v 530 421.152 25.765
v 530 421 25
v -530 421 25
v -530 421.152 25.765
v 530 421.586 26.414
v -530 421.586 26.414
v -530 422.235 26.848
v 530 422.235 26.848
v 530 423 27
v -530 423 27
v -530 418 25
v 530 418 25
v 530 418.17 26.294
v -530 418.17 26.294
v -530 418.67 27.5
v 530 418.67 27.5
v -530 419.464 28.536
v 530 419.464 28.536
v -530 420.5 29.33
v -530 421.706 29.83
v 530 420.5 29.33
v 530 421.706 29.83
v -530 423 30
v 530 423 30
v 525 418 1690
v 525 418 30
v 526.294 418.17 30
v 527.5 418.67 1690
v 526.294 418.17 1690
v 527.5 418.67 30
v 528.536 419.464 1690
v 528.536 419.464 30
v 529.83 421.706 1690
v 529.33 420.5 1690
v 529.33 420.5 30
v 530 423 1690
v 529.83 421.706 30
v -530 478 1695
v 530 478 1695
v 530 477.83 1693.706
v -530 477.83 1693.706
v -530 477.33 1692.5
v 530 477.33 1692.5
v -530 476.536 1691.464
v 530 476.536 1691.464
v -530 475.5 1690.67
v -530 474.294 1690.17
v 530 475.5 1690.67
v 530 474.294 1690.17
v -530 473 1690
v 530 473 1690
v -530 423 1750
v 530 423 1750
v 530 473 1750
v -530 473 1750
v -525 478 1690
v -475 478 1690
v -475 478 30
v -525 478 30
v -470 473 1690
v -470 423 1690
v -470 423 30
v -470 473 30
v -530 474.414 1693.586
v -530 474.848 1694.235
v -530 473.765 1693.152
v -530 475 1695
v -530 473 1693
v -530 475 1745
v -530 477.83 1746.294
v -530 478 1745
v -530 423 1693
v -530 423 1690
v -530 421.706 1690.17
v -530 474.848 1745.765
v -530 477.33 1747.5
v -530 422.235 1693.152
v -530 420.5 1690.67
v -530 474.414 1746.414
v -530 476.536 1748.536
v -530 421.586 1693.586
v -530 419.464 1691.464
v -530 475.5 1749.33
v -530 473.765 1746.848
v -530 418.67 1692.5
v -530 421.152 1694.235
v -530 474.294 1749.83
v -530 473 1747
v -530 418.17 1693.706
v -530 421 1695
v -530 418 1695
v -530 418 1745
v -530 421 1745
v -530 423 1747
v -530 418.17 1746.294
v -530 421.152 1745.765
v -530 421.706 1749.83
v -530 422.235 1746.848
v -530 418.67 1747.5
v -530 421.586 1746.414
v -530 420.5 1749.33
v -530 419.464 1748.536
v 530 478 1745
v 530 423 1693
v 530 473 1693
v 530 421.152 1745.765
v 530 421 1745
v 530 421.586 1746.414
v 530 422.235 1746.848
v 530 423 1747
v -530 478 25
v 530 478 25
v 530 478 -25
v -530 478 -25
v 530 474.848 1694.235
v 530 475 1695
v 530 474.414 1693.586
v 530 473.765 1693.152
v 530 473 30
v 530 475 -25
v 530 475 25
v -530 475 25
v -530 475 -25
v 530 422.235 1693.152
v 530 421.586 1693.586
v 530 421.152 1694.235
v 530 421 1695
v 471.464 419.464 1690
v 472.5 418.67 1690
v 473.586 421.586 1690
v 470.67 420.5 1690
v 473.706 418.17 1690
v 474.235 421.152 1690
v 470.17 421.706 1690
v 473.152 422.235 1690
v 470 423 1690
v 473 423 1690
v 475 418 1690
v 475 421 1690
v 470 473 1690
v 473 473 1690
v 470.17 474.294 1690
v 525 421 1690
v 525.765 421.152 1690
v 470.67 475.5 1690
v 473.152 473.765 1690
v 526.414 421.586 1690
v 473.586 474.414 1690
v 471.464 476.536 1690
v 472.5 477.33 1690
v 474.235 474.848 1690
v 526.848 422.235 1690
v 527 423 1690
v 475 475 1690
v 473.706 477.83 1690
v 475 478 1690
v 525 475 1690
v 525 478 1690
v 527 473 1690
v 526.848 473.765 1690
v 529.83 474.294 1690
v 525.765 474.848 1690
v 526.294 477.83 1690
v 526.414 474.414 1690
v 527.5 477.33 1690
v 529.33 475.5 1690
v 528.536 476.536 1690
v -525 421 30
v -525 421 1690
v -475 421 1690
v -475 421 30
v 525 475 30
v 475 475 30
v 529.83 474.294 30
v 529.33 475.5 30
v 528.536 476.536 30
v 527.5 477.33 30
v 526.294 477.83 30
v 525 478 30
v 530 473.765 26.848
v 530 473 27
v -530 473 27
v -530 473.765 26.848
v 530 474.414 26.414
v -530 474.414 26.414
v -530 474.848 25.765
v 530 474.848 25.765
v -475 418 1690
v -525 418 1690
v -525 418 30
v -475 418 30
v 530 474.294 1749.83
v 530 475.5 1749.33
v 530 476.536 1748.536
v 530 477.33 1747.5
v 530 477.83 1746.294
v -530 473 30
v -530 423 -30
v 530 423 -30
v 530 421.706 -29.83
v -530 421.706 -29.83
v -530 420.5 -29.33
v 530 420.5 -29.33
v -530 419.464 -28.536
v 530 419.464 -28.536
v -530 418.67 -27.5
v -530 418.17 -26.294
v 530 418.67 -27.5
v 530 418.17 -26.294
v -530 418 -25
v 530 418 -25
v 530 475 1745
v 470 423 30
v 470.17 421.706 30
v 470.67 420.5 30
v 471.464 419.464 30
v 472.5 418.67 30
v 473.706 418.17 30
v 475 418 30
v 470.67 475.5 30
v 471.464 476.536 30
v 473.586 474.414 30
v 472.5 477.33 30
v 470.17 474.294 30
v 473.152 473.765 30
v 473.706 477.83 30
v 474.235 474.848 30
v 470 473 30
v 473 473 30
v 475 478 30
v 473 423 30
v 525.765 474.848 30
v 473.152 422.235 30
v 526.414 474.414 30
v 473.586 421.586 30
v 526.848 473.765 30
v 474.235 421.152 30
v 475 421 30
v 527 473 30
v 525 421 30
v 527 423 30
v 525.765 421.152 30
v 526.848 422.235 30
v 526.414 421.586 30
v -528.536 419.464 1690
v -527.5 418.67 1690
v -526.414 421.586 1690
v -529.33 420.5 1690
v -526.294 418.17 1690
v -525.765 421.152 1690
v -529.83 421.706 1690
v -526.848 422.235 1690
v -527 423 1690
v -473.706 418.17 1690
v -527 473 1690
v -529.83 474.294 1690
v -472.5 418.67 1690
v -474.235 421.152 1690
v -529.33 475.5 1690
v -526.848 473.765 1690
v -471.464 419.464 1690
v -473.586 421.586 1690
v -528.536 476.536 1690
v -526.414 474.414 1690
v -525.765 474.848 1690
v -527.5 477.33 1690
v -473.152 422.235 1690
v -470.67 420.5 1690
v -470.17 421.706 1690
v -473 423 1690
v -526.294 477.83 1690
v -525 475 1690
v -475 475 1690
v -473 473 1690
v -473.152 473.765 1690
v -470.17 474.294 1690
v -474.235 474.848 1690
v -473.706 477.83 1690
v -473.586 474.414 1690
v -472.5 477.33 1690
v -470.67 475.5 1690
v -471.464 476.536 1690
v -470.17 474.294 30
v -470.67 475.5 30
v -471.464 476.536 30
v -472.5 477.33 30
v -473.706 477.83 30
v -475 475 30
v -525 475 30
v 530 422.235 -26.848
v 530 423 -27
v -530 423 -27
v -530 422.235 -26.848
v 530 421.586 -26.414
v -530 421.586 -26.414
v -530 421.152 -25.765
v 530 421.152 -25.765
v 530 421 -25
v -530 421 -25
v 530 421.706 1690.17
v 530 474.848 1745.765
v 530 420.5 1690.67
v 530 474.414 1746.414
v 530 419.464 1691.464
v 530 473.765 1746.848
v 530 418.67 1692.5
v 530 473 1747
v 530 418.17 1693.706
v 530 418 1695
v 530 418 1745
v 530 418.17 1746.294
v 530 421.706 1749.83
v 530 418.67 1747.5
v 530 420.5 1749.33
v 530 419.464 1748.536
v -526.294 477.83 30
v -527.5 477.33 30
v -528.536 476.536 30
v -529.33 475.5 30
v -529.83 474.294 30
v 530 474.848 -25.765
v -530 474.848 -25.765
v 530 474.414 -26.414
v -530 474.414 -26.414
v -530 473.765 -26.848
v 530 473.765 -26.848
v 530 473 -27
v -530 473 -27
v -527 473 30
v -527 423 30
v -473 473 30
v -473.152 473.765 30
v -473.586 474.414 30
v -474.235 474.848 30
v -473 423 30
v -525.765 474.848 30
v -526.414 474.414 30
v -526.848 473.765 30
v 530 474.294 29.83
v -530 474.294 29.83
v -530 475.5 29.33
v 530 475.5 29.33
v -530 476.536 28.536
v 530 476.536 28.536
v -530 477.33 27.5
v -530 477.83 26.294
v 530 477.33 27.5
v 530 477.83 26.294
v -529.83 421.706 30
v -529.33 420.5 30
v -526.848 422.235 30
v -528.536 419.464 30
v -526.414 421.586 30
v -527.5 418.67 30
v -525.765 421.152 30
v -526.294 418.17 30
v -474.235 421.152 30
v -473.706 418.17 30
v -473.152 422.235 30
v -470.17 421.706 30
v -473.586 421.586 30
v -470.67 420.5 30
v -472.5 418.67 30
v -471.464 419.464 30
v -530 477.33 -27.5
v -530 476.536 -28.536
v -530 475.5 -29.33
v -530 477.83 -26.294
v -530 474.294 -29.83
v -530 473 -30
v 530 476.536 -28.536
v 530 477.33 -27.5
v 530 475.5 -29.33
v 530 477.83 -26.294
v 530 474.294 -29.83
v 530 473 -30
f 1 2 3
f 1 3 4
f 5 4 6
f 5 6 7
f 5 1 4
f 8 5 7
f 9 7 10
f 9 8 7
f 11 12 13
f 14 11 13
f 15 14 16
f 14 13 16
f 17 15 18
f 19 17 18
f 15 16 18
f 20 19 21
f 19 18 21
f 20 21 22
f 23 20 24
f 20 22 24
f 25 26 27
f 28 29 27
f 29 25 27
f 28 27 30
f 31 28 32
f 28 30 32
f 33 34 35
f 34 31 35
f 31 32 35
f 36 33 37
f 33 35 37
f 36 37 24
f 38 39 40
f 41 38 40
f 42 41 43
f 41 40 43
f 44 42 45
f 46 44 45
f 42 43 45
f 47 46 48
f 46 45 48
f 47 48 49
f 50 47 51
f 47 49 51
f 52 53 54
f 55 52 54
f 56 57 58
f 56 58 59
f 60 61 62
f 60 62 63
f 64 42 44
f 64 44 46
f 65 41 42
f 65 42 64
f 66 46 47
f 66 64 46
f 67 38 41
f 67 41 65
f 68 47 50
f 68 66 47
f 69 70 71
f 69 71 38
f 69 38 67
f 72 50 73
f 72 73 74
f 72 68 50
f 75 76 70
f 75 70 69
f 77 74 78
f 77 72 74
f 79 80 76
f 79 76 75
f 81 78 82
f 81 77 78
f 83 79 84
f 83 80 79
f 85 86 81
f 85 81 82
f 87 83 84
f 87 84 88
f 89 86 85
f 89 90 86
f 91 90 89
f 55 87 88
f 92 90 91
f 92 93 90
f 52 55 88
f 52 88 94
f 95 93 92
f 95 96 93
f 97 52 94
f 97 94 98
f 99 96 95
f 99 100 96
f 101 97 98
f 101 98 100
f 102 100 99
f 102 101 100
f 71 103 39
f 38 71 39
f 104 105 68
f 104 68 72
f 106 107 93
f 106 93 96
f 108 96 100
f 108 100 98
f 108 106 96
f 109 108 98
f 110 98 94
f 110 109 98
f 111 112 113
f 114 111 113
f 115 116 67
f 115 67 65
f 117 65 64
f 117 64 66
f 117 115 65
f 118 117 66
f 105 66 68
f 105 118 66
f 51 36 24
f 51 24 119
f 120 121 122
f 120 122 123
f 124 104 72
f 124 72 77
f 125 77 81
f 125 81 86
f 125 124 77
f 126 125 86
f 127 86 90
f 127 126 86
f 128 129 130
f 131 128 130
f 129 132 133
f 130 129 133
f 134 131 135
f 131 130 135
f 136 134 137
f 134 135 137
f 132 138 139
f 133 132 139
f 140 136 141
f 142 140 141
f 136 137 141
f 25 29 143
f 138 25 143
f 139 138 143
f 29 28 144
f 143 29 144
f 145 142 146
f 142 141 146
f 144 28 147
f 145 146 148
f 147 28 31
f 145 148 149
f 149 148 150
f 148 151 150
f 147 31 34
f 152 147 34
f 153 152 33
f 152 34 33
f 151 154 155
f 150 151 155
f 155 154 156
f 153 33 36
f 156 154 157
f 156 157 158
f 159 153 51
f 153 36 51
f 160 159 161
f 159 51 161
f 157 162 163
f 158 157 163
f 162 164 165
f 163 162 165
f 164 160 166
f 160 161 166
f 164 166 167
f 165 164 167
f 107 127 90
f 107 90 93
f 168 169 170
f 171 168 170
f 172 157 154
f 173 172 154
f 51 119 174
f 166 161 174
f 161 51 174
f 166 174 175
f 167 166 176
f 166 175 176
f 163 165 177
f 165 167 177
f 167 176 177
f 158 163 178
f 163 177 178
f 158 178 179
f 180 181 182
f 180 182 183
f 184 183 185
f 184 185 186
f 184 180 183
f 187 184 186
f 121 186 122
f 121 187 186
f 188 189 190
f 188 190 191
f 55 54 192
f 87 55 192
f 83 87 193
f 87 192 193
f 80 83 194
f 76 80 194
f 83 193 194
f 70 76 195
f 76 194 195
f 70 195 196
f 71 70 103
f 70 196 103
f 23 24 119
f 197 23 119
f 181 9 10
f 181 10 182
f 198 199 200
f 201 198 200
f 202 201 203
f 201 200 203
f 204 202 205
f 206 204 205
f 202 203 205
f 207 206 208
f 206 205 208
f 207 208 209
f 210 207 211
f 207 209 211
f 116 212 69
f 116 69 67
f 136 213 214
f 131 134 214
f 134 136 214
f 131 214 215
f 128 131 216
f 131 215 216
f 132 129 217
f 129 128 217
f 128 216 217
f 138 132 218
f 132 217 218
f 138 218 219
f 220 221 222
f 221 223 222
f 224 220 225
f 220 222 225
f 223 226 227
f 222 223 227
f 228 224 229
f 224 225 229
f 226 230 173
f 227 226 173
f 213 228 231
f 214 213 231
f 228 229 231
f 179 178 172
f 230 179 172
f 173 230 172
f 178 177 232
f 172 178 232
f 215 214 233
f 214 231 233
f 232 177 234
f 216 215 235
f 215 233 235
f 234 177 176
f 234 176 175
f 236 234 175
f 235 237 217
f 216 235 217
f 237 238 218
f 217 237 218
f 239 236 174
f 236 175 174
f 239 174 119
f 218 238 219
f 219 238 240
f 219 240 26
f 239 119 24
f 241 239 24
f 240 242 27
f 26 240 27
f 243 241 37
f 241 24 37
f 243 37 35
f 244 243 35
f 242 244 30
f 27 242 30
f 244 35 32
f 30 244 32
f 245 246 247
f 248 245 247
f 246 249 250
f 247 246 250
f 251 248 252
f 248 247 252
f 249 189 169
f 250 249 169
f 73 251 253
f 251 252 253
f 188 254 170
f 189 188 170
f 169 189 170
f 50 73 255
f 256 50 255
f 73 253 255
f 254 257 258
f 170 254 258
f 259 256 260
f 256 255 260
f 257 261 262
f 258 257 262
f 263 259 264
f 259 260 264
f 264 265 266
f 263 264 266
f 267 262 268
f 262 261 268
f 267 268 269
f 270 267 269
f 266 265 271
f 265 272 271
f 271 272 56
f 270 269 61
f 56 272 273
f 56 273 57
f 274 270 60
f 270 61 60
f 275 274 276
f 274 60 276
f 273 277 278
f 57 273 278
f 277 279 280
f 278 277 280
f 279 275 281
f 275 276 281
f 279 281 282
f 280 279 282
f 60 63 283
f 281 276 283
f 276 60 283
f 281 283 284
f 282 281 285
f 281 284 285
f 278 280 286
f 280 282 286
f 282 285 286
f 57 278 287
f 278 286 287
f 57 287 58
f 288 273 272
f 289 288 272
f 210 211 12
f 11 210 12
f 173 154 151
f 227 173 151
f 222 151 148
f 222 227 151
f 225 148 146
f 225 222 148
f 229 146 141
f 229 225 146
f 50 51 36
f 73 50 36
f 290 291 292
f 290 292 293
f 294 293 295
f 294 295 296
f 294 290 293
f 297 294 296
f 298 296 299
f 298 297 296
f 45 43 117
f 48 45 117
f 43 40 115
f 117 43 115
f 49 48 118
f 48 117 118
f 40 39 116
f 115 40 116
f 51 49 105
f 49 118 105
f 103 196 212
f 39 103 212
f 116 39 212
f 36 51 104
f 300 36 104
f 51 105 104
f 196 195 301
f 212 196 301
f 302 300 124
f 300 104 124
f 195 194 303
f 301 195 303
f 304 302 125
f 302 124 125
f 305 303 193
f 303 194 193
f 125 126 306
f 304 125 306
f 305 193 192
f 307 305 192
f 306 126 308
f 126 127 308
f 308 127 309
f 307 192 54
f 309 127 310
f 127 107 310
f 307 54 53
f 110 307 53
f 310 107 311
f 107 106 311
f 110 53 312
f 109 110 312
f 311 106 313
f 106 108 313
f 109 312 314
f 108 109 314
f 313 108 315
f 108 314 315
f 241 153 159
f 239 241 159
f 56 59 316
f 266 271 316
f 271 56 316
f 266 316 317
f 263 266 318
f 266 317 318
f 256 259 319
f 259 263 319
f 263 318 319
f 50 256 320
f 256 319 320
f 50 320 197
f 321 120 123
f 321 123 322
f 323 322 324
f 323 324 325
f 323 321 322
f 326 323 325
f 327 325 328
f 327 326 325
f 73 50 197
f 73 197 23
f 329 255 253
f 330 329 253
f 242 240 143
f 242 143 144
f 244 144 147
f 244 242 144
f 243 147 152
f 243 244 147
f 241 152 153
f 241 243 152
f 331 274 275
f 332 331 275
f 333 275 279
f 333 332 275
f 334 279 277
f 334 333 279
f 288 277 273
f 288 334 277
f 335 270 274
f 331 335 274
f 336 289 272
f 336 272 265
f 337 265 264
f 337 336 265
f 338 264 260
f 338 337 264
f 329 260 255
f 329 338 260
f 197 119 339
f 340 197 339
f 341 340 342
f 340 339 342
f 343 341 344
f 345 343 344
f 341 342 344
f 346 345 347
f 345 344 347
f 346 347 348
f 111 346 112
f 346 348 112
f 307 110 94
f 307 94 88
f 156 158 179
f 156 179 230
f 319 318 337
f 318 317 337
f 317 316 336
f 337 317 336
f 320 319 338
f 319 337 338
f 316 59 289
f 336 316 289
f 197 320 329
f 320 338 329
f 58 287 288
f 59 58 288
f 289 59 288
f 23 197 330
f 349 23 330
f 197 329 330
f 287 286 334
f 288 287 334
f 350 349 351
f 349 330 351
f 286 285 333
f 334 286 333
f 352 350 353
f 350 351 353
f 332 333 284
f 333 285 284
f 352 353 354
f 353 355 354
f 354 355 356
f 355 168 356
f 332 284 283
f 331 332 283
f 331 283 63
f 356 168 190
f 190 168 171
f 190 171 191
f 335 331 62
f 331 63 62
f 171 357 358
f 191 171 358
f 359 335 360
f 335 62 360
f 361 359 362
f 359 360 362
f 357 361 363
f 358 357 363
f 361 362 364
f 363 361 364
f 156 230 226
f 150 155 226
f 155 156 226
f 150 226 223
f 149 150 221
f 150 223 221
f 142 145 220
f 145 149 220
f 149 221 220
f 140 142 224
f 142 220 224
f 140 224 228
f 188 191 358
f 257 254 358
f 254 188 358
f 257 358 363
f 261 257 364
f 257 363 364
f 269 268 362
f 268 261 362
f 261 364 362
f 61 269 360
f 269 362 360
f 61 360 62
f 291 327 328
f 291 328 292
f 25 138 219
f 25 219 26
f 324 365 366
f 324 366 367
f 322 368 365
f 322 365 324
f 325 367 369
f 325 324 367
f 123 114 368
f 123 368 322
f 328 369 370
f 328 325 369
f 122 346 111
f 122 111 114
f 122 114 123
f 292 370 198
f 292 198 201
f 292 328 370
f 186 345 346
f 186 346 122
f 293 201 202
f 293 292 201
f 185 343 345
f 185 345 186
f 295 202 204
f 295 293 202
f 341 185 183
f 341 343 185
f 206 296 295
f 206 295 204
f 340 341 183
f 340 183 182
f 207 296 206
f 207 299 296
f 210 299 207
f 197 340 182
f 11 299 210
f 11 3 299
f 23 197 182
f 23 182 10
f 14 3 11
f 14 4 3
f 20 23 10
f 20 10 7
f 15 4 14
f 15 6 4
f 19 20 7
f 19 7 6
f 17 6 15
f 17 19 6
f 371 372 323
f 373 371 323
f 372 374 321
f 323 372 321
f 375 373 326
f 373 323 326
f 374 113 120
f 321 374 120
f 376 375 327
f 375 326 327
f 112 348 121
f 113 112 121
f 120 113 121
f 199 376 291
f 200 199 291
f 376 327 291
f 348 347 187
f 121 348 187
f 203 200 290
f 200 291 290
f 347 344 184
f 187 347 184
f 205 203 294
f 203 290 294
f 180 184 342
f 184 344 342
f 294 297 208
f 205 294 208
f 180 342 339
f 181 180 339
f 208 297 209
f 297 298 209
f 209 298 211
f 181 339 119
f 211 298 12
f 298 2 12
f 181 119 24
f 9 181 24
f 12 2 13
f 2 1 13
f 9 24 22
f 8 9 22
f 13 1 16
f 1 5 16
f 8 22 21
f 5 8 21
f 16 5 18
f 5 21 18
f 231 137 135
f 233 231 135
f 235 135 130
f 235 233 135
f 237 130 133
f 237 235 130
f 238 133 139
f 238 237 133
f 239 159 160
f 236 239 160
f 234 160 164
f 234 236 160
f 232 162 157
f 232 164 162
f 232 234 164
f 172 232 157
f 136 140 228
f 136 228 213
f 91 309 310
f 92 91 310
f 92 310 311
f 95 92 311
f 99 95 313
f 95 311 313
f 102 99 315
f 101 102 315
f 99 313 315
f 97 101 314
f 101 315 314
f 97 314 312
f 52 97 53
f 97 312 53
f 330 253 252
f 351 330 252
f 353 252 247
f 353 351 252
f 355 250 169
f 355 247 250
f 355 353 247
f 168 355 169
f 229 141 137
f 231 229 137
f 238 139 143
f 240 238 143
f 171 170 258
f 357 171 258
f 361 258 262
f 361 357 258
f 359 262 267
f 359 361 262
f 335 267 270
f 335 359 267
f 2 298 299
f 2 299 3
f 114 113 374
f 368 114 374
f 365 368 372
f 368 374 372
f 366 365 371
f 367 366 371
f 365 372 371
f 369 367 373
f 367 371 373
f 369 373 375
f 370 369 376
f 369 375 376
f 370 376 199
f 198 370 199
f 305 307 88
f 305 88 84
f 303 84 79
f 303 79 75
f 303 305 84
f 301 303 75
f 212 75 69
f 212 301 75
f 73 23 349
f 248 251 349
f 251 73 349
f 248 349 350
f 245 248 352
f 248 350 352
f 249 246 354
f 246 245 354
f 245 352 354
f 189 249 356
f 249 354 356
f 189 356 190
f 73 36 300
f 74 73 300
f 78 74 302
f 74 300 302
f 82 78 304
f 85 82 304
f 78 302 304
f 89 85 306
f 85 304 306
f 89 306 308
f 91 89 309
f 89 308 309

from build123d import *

# Parameters (mm, degrees)
F_120_X_80_X_8_1_DEPTH      = 1030
F_120_X_80_X_8_1_DEPTH_BACK = 30
F_120_X_80_X_8_1_2_DEPTH    = 1060
F_120_X_80_X_8_1_3_DEPTH    = 1722
F_120_X_80_X_8_1_4_DEPTH    = 1722


with BuildPart() as part:
    # Sketch1 → Прямоугольная труба 120 X 80 X 8(1) (new, two sides: drawn at the far end of the back side and taken through both)
    with BuildSketch(Plane(origin=(500, 448, 1720), x_dir=(0, -1, 0), z_dir=(-1, 0, 0)).offset(-F_120_X_80_X_8_1_DEPTH_BACK)):
        with BuildLine():
            Line((-25, -30), (25, -30))
            ThreePointArc((25, -30), (28.535533906, -28.535533906), (30, -25))
            Line((30, -25), (30, 25))
            ThreePointArc((30, 25), (28.535533906, 28.535533906), (25, 30))
            Line((25, 30), (-25, 30))
            ThreePointArc((-25, 30), (-28.535533906, 28.535533906), (-30, 25))
            Line((-30, 25), (-30, -25))
            ThreePointArc((-30, -25), (-28.535533906, -28.535533906), (-25, -30))
        make_face()
        with BuildLine():
            Line((-25, -27), (25, -27))
            ThreePointArc((25, -27), (26.414213562, -26.414213562), (27, -25))
            Line((27, -25), (27, 25))
            ThreePointArc((27, 25), (26.414213562, 26.414213562), (25, 27))
            Line((25, 27), (-25, 27))
            ThreePointArc((-25, 27), (-26.414213562, 26.414213562), (-27, 25))
            Line((-27, 25), (-27, -25))
            ThreePointArc((-27, -25), (-26.414213562, -26.414213562), (-25, -27))
        make_face(mode=Mode.SUBTRACT)
    extrude(amount=F_120_X_80_X_8_1_DEPTH + F_120_X_80_X_8_1_DEPTH_BACK)


with BuildPart() as body_2:
    # Sketch1 on segment 2 (carried to segment 2) → 120 X 80 X 8_1 2 (new body)
    with BuildSketch(Plane(origin=(530, 448, 0), x_dir=(0, -1, 0), z_dir=(-1, 0, 0))):
        with BuildLine():
            Line((-25, -30), (25, -30))
            ThreePointArc((25, -30), (28.535533906, -28.535533906), (30, -25))
            Line((30, -25), (30, 25))
            ThreePointArc((30, 25), (28.535533906, 28.535533906), (25, 30))
            Line((25, 30), (-25, 30))
            ThreePointArc((-25, 30), (-28.535533906, 28.535533906), (-30, 25))
            Line((-30, 25), (-30, -25))
            ThreePointArc((-30, -25), (-28.535533906, -28.535533906), (-25, -30))
        make_face()
        with BuildLine():
            Line((-25, -27), (25, -27))
            ThreePointArc((25, -27), (26.414213562, -26.414213562), (27, -25))
            Line((27, -25), (27, 25))
            ThreePointArc((27, 25), (26.414213562, 26.414213562), (25, 27))
            Line((25, 27), (-25, 27))
            ThreePointArc((-25, 27), (-26.414213562, 26.414213562), (-27, 25))
            Line((-27, 25), (-27, -25))
            ThreePointArc((-27, -25), (-26.414213562, -26.414213562), (-25, -27))
        make_face(mode=Mode.SUBTRACT)
    extrude(amount=F_120_X_80_X_8_1_2_DEPTH)


with BuildPart() as body_3:
    # Sketch1 on segment 3 (carried to segment 3) → 120 X 80 X 8_1 3 (new body)
    with BuildSketch(Plane(origin=(-500, 448, -1), x_dir=(0, -1, 0), z_dir=(0, 0, 1))):
        with BuildLine():
            Line((-25, -30), (25, -30))
            ThreePointArc((25, -30), (28.535533906, -28.535533906), (30, -25))
            Line((30, -25), (30, 25))
            ThreePointArc((30, 25), (28.535533906, 28.535533906), (25, 30))
            Line((25, 30), (-25, 30))
            ThreePointArc((-25, 30), (-28.535533906, 28.535533906), (-30, 25))
            Line((-30, 25), (-30, -25))
            ThreePointArc((-30, -25), (-28.535533906, -28.535533906), (-25, -30))
        make_face()
        with BuildLine():
            Line((-25, -27), (25, -27))
            ThreePointArc((25, -27), (26.414213562, -26.414213562), (27, -25))
            Line((27, -25), (27, 25))
            ThreePointArc((27, 25), (26.414213562, 26.414213562), (25, 27))
            Line((25, 27), (-25, 27))
            ThreePointArc((-25, 27), (-26.414213562, 26.414213562), (-27, 25))
            Line((-27, 25), (-27, -25))
            ThreePointArc((-27, -25), (-26.414213562, -26.414213562), (-25, -27))
        make_face(mode=Mode.SUBTRACT)
    extrude(amount=F_120_X_80_X_8_1_3_DEPTH)

    # 120 X 80 X 8_1 3 end butt 1
    split(bisect_by=Plane(origin=(-500, 448, 30), x_dir=(0, -1, 0), z_dir=(0, 0, 1)), keep=Keep.TOP)

    # 120 X 80 X 8_1 3 end butt 2
    split(bisect_by=Plane(origin=(-500, 448, 1690), x_dir=(0, 1, 0), z_dir=(0, 0, -1)), keep=Keep.TOP)


with BuildPart() as body_4:
    # Sketch1 on segment 4 (carried to segment 4) → 120 X 80 X 8_1 4 (new body)
    with BuildSketch(Plane(origin=(500, 448, -1), x_dir=(0, -1, 0), z_dir=(0, 0, 1))):
        with BuildLine():
            Line((-25, -30), (25, -30))
            ThreePointArc((25, -30), (28.535533906, -28.535533906), (30, -25))
            Line((30, -25), (30, 25))
            ThreePointArc((30, 25), (28.535533906, 28.535533906), (25, 30))
            Line((25, 30), (-25, 30))
            ThreePointArc((-25, 30), (-28.535533906, 28.535533906), (-30, 25))
            Line((-30, 25), (-30, -25))
            ThreePointArc((-30, -25), (-28.535533906, -28.535533906), (-25, -30))
        make_face()
        with BuildLine():
            Line((-25, -27), (25, -27))
            ThreePointArc((25, -27), (26.414213562, -26.414213562), (27, -25))
            Line((27, -25), (27, 25))
            ThreePointArc((27, 25), (26.414213562, 26.414213562), (25, 27))
            Line((25, 27), (-25, 27))
            ThreePointArc((-25, 27), (-26.414213562, 26.414213562), (-27, 25))
            Line((-27, 25), (-27, -25))
            ThreePointArc((-27, -25), (-26.414213562, -26.414213562), (-25, -27))
        make_face(mode=Mode.SUBTRACT)
    extrude(amount=F_120_X_80_X_8_1_4_DEPTH)

    # 120 X 80 X 8_1 4 end butt 1
    split(bisect_by=Plane(origin=(500, 448, 30), x_dir=(0, -1, 0), z_dir=(0, 0, 1)), keep=Keep.TOP)

    # 120 X 80 X 8_1 4 end butt 2
    split(bisect_by=Plane(origin=(500, 448, 1690), x_dir=(0, 1, 0), z_dir=(0, 0, -1)), keep=Keep.TOP)


solid = Compound([part.part, body_2.part, body_3.part, body_4.part])
